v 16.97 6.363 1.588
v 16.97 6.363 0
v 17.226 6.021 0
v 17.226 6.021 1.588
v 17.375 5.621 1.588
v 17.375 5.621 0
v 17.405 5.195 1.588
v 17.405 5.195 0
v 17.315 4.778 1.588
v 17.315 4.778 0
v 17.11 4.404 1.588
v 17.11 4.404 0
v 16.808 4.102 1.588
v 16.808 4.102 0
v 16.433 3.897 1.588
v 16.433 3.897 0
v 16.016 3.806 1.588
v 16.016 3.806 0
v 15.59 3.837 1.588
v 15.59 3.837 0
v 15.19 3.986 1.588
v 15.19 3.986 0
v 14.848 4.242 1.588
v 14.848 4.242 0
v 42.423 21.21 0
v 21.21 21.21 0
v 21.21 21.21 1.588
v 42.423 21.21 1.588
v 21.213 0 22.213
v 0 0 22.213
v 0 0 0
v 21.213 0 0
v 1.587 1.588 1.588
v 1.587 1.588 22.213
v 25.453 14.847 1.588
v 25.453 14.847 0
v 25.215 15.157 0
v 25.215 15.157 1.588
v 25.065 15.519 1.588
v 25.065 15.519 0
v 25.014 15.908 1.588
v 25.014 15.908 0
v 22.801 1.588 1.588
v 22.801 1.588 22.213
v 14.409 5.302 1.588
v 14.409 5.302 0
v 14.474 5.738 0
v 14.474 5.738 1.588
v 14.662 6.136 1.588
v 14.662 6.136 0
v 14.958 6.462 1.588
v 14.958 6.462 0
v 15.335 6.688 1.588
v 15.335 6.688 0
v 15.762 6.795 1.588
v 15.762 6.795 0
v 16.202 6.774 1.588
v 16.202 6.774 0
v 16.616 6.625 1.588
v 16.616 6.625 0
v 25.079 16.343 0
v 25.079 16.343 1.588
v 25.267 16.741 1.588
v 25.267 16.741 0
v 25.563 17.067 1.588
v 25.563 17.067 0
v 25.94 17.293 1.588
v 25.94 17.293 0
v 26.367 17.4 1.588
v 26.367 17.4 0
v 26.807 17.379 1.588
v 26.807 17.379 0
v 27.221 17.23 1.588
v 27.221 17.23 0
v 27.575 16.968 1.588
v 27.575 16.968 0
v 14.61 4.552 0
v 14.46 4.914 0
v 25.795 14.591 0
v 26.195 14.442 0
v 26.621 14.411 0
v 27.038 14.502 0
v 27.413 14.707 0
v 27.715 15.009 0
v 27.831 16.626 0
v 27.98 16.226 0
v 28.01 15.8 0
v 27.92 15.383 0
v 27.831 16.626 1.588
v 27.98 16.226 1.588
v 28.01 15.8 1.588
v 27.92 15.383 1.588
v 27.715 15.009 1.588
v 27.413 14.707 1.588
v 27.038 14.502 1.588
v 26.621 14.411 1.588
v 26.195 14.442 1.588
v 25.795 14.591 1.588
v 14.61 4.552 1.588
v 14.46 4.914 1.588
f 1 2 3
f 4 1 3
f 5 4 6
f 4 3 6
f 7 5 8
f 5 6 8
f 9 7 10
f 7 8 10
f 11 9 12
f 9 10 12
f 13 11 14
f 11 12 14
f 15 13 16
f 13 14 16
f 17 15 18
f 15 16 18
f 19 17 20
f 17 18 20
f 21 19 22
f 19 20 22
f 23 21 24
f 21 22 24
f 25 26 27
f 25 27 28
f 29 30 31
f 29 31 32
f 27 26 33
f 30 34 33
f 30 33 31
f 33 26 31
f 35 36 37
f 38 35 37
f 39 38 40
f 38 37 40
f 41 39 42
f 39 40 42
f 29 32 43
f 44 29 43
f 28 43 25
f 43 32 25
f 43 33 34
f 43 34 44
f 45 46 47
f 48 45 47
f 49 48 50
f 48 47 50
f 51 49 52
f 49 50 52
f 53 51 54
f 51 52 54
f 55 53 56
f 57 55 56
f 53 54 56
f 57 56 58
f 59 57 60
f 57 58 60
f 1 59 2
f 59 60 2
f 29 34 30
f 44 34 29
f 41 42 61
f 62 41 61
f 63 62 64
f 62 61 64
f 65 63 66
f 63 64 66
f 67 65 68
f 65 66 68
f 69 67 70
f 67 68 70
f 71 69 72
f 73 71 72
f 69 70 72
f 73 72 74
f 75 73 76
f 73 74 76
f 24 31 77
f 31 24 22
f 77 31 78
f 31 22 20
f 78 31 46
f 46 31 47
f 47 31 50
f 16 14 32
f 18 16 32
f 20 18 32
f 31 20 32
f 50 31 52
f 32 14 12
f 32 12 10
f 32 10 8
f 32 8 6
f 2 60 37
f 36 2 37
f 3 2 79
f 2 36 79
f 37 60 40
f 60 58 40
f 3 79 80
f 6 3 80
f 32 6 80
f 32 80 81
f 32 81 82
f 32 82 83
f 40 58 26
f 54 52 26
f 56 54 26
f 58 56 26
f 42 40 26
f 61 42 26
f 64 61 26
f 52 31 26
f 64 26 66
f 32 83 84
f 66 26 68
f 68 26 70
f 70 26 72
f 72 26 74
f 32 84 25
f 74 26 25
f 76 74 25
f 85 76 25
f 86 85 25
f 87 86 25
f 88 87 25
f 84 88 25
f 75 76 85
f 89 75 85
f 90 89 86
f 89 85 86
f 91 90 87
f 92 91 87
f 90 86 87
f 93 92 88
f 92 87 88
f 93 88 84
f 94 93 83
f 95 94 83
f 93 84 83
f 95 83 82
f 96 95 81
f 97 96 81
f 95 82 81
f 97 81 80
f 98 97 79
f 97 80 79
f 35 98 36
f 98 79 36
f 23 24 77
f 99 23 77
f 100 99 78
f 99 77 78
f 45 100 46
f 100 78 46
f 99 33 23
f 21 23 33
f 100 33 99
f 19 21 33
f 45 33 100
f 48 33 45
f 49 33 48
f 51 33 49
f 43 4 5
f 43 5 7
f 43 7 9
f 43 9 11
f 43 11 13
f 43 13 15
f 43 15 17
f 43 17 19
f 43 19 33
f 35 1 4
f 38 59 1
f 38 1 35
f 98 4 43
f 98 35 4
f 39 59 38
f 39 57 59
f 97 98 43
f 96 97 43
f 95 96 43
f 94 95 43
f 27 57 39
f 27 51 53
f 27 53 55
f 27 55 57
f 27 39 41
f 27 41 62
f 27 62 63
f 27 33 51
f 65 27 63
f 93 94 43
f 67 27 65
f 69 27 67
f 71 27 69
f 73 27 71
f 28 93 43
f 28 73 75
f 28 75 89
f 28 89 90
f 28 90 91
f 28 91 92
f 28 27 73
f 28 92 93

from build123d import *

# Parameters (mm, degrees)
SKETCH1_W           = 45
SKETCH1_H           = 21.21
BOSS_EXTRUDE1_DEPTH = 1.5875
SKETCH2_W           = 45
SKETCH2_H           = 1.5875
BOSS_EXTRUDE2_DEPTH = 20.62570344
CUT_EXTRUDE3_DEPTH  = 55.482020035
CUT_EXTRUDE4_DEPTH  = 53.373835995


with BuildPart() as part:
    # Sketch1 → Boss-Extrude1 (new body)
    with BuildSketch(Plane.XY):
        with Locations((22.5, 10.605)):
            Rectangle(SKETCH1_W, SKETCH1_H)
    extrude(amount=BOSS_EXTRUDE1_DEPTH)

    # Sketch2 → Boss-Extrude2 (add)
    with BuildSketch(Plane.XY.offset(1.5875)):
        with Locations((22.5, 0.79375)):
            Rectangle(SKETCH2_W, SKETCH2_H)
    extrude(amount=BOSS_EXTRUDE2_DEPTH)

    # Sketch5 → Cut-Extrude3 (cut, through all)
    with BuildSketch(Plane(origin=(0, 0, 0), x_dir=(-1, 0, 0), z_dir=(0, 0, -1))):
        Polygon((-21.21, 21.21), (0, 0), (0, 21.21), align=None)
        Polygon((-45, 0), (-21.213203436, 0), (-42.423203436, 21.21), (-45, 21.21), align=None)
    extrude(amount=-CUT_EXTRUDE3_DEPTH, mode=Mode.SUBTRACT)

    # Sketch4 → Cut-Extrude4 (cut, through all)
    with BuildSketch(Plane(origin=(0, 0, 0), x_dir=(-1, 0, 0), z_dir=(0, 0, -1))):
        with BuildLine():
            ThreePointArc((-14.409101718, 5.3025), (-15.335076569, 6.688319299), (-16.96976189, 6.363160172))
            Line((-16.96976189, 6.363160172), (-14.848441546, 4.241839828))
            ThreePointArc((-14.848441546, 4.241839828), (-14.523282419, 4.728474851), (-14.409101718, 5.3025))
        make_face()
        with BuildLine():
            Line((-14.848441546, 4.241839828), (-16.96976189, 6.363160172))
            ThreePointArc((-16.96976189, 6.363160172), (-16.96976189, 4.241839828), (-14.848441546, 4.241839828))
        make_face()
        with BuildLine():
            ThreePointArc((-25.014101718, 15.9075), (-25.940076569, 17.293319299), (-27.57476189, 16.968160172))
            Line((-27.57476189, 16.968160172), (-25.453441546, 14.846839828))
            ThreePointArc((-25.453441546, 14.846839828), (-25.128282419, 15.333474851), (-25.014101718, 15.9075))
        make_face()
        with BuildLine():
            Line((-25.453441546, 14.846839828), (-27.57476189, 16.968160172))
            ThreePointArc((-27.57476189, 16.968160172), (-27.57476189, 14.846839828), (-25.453441546, 14.846839828))
        make_face()
    extrude(amount=-CUT_EXTRUDE4_DEPTH, mode=Mode.SUBTRACT)


solid = part.part
